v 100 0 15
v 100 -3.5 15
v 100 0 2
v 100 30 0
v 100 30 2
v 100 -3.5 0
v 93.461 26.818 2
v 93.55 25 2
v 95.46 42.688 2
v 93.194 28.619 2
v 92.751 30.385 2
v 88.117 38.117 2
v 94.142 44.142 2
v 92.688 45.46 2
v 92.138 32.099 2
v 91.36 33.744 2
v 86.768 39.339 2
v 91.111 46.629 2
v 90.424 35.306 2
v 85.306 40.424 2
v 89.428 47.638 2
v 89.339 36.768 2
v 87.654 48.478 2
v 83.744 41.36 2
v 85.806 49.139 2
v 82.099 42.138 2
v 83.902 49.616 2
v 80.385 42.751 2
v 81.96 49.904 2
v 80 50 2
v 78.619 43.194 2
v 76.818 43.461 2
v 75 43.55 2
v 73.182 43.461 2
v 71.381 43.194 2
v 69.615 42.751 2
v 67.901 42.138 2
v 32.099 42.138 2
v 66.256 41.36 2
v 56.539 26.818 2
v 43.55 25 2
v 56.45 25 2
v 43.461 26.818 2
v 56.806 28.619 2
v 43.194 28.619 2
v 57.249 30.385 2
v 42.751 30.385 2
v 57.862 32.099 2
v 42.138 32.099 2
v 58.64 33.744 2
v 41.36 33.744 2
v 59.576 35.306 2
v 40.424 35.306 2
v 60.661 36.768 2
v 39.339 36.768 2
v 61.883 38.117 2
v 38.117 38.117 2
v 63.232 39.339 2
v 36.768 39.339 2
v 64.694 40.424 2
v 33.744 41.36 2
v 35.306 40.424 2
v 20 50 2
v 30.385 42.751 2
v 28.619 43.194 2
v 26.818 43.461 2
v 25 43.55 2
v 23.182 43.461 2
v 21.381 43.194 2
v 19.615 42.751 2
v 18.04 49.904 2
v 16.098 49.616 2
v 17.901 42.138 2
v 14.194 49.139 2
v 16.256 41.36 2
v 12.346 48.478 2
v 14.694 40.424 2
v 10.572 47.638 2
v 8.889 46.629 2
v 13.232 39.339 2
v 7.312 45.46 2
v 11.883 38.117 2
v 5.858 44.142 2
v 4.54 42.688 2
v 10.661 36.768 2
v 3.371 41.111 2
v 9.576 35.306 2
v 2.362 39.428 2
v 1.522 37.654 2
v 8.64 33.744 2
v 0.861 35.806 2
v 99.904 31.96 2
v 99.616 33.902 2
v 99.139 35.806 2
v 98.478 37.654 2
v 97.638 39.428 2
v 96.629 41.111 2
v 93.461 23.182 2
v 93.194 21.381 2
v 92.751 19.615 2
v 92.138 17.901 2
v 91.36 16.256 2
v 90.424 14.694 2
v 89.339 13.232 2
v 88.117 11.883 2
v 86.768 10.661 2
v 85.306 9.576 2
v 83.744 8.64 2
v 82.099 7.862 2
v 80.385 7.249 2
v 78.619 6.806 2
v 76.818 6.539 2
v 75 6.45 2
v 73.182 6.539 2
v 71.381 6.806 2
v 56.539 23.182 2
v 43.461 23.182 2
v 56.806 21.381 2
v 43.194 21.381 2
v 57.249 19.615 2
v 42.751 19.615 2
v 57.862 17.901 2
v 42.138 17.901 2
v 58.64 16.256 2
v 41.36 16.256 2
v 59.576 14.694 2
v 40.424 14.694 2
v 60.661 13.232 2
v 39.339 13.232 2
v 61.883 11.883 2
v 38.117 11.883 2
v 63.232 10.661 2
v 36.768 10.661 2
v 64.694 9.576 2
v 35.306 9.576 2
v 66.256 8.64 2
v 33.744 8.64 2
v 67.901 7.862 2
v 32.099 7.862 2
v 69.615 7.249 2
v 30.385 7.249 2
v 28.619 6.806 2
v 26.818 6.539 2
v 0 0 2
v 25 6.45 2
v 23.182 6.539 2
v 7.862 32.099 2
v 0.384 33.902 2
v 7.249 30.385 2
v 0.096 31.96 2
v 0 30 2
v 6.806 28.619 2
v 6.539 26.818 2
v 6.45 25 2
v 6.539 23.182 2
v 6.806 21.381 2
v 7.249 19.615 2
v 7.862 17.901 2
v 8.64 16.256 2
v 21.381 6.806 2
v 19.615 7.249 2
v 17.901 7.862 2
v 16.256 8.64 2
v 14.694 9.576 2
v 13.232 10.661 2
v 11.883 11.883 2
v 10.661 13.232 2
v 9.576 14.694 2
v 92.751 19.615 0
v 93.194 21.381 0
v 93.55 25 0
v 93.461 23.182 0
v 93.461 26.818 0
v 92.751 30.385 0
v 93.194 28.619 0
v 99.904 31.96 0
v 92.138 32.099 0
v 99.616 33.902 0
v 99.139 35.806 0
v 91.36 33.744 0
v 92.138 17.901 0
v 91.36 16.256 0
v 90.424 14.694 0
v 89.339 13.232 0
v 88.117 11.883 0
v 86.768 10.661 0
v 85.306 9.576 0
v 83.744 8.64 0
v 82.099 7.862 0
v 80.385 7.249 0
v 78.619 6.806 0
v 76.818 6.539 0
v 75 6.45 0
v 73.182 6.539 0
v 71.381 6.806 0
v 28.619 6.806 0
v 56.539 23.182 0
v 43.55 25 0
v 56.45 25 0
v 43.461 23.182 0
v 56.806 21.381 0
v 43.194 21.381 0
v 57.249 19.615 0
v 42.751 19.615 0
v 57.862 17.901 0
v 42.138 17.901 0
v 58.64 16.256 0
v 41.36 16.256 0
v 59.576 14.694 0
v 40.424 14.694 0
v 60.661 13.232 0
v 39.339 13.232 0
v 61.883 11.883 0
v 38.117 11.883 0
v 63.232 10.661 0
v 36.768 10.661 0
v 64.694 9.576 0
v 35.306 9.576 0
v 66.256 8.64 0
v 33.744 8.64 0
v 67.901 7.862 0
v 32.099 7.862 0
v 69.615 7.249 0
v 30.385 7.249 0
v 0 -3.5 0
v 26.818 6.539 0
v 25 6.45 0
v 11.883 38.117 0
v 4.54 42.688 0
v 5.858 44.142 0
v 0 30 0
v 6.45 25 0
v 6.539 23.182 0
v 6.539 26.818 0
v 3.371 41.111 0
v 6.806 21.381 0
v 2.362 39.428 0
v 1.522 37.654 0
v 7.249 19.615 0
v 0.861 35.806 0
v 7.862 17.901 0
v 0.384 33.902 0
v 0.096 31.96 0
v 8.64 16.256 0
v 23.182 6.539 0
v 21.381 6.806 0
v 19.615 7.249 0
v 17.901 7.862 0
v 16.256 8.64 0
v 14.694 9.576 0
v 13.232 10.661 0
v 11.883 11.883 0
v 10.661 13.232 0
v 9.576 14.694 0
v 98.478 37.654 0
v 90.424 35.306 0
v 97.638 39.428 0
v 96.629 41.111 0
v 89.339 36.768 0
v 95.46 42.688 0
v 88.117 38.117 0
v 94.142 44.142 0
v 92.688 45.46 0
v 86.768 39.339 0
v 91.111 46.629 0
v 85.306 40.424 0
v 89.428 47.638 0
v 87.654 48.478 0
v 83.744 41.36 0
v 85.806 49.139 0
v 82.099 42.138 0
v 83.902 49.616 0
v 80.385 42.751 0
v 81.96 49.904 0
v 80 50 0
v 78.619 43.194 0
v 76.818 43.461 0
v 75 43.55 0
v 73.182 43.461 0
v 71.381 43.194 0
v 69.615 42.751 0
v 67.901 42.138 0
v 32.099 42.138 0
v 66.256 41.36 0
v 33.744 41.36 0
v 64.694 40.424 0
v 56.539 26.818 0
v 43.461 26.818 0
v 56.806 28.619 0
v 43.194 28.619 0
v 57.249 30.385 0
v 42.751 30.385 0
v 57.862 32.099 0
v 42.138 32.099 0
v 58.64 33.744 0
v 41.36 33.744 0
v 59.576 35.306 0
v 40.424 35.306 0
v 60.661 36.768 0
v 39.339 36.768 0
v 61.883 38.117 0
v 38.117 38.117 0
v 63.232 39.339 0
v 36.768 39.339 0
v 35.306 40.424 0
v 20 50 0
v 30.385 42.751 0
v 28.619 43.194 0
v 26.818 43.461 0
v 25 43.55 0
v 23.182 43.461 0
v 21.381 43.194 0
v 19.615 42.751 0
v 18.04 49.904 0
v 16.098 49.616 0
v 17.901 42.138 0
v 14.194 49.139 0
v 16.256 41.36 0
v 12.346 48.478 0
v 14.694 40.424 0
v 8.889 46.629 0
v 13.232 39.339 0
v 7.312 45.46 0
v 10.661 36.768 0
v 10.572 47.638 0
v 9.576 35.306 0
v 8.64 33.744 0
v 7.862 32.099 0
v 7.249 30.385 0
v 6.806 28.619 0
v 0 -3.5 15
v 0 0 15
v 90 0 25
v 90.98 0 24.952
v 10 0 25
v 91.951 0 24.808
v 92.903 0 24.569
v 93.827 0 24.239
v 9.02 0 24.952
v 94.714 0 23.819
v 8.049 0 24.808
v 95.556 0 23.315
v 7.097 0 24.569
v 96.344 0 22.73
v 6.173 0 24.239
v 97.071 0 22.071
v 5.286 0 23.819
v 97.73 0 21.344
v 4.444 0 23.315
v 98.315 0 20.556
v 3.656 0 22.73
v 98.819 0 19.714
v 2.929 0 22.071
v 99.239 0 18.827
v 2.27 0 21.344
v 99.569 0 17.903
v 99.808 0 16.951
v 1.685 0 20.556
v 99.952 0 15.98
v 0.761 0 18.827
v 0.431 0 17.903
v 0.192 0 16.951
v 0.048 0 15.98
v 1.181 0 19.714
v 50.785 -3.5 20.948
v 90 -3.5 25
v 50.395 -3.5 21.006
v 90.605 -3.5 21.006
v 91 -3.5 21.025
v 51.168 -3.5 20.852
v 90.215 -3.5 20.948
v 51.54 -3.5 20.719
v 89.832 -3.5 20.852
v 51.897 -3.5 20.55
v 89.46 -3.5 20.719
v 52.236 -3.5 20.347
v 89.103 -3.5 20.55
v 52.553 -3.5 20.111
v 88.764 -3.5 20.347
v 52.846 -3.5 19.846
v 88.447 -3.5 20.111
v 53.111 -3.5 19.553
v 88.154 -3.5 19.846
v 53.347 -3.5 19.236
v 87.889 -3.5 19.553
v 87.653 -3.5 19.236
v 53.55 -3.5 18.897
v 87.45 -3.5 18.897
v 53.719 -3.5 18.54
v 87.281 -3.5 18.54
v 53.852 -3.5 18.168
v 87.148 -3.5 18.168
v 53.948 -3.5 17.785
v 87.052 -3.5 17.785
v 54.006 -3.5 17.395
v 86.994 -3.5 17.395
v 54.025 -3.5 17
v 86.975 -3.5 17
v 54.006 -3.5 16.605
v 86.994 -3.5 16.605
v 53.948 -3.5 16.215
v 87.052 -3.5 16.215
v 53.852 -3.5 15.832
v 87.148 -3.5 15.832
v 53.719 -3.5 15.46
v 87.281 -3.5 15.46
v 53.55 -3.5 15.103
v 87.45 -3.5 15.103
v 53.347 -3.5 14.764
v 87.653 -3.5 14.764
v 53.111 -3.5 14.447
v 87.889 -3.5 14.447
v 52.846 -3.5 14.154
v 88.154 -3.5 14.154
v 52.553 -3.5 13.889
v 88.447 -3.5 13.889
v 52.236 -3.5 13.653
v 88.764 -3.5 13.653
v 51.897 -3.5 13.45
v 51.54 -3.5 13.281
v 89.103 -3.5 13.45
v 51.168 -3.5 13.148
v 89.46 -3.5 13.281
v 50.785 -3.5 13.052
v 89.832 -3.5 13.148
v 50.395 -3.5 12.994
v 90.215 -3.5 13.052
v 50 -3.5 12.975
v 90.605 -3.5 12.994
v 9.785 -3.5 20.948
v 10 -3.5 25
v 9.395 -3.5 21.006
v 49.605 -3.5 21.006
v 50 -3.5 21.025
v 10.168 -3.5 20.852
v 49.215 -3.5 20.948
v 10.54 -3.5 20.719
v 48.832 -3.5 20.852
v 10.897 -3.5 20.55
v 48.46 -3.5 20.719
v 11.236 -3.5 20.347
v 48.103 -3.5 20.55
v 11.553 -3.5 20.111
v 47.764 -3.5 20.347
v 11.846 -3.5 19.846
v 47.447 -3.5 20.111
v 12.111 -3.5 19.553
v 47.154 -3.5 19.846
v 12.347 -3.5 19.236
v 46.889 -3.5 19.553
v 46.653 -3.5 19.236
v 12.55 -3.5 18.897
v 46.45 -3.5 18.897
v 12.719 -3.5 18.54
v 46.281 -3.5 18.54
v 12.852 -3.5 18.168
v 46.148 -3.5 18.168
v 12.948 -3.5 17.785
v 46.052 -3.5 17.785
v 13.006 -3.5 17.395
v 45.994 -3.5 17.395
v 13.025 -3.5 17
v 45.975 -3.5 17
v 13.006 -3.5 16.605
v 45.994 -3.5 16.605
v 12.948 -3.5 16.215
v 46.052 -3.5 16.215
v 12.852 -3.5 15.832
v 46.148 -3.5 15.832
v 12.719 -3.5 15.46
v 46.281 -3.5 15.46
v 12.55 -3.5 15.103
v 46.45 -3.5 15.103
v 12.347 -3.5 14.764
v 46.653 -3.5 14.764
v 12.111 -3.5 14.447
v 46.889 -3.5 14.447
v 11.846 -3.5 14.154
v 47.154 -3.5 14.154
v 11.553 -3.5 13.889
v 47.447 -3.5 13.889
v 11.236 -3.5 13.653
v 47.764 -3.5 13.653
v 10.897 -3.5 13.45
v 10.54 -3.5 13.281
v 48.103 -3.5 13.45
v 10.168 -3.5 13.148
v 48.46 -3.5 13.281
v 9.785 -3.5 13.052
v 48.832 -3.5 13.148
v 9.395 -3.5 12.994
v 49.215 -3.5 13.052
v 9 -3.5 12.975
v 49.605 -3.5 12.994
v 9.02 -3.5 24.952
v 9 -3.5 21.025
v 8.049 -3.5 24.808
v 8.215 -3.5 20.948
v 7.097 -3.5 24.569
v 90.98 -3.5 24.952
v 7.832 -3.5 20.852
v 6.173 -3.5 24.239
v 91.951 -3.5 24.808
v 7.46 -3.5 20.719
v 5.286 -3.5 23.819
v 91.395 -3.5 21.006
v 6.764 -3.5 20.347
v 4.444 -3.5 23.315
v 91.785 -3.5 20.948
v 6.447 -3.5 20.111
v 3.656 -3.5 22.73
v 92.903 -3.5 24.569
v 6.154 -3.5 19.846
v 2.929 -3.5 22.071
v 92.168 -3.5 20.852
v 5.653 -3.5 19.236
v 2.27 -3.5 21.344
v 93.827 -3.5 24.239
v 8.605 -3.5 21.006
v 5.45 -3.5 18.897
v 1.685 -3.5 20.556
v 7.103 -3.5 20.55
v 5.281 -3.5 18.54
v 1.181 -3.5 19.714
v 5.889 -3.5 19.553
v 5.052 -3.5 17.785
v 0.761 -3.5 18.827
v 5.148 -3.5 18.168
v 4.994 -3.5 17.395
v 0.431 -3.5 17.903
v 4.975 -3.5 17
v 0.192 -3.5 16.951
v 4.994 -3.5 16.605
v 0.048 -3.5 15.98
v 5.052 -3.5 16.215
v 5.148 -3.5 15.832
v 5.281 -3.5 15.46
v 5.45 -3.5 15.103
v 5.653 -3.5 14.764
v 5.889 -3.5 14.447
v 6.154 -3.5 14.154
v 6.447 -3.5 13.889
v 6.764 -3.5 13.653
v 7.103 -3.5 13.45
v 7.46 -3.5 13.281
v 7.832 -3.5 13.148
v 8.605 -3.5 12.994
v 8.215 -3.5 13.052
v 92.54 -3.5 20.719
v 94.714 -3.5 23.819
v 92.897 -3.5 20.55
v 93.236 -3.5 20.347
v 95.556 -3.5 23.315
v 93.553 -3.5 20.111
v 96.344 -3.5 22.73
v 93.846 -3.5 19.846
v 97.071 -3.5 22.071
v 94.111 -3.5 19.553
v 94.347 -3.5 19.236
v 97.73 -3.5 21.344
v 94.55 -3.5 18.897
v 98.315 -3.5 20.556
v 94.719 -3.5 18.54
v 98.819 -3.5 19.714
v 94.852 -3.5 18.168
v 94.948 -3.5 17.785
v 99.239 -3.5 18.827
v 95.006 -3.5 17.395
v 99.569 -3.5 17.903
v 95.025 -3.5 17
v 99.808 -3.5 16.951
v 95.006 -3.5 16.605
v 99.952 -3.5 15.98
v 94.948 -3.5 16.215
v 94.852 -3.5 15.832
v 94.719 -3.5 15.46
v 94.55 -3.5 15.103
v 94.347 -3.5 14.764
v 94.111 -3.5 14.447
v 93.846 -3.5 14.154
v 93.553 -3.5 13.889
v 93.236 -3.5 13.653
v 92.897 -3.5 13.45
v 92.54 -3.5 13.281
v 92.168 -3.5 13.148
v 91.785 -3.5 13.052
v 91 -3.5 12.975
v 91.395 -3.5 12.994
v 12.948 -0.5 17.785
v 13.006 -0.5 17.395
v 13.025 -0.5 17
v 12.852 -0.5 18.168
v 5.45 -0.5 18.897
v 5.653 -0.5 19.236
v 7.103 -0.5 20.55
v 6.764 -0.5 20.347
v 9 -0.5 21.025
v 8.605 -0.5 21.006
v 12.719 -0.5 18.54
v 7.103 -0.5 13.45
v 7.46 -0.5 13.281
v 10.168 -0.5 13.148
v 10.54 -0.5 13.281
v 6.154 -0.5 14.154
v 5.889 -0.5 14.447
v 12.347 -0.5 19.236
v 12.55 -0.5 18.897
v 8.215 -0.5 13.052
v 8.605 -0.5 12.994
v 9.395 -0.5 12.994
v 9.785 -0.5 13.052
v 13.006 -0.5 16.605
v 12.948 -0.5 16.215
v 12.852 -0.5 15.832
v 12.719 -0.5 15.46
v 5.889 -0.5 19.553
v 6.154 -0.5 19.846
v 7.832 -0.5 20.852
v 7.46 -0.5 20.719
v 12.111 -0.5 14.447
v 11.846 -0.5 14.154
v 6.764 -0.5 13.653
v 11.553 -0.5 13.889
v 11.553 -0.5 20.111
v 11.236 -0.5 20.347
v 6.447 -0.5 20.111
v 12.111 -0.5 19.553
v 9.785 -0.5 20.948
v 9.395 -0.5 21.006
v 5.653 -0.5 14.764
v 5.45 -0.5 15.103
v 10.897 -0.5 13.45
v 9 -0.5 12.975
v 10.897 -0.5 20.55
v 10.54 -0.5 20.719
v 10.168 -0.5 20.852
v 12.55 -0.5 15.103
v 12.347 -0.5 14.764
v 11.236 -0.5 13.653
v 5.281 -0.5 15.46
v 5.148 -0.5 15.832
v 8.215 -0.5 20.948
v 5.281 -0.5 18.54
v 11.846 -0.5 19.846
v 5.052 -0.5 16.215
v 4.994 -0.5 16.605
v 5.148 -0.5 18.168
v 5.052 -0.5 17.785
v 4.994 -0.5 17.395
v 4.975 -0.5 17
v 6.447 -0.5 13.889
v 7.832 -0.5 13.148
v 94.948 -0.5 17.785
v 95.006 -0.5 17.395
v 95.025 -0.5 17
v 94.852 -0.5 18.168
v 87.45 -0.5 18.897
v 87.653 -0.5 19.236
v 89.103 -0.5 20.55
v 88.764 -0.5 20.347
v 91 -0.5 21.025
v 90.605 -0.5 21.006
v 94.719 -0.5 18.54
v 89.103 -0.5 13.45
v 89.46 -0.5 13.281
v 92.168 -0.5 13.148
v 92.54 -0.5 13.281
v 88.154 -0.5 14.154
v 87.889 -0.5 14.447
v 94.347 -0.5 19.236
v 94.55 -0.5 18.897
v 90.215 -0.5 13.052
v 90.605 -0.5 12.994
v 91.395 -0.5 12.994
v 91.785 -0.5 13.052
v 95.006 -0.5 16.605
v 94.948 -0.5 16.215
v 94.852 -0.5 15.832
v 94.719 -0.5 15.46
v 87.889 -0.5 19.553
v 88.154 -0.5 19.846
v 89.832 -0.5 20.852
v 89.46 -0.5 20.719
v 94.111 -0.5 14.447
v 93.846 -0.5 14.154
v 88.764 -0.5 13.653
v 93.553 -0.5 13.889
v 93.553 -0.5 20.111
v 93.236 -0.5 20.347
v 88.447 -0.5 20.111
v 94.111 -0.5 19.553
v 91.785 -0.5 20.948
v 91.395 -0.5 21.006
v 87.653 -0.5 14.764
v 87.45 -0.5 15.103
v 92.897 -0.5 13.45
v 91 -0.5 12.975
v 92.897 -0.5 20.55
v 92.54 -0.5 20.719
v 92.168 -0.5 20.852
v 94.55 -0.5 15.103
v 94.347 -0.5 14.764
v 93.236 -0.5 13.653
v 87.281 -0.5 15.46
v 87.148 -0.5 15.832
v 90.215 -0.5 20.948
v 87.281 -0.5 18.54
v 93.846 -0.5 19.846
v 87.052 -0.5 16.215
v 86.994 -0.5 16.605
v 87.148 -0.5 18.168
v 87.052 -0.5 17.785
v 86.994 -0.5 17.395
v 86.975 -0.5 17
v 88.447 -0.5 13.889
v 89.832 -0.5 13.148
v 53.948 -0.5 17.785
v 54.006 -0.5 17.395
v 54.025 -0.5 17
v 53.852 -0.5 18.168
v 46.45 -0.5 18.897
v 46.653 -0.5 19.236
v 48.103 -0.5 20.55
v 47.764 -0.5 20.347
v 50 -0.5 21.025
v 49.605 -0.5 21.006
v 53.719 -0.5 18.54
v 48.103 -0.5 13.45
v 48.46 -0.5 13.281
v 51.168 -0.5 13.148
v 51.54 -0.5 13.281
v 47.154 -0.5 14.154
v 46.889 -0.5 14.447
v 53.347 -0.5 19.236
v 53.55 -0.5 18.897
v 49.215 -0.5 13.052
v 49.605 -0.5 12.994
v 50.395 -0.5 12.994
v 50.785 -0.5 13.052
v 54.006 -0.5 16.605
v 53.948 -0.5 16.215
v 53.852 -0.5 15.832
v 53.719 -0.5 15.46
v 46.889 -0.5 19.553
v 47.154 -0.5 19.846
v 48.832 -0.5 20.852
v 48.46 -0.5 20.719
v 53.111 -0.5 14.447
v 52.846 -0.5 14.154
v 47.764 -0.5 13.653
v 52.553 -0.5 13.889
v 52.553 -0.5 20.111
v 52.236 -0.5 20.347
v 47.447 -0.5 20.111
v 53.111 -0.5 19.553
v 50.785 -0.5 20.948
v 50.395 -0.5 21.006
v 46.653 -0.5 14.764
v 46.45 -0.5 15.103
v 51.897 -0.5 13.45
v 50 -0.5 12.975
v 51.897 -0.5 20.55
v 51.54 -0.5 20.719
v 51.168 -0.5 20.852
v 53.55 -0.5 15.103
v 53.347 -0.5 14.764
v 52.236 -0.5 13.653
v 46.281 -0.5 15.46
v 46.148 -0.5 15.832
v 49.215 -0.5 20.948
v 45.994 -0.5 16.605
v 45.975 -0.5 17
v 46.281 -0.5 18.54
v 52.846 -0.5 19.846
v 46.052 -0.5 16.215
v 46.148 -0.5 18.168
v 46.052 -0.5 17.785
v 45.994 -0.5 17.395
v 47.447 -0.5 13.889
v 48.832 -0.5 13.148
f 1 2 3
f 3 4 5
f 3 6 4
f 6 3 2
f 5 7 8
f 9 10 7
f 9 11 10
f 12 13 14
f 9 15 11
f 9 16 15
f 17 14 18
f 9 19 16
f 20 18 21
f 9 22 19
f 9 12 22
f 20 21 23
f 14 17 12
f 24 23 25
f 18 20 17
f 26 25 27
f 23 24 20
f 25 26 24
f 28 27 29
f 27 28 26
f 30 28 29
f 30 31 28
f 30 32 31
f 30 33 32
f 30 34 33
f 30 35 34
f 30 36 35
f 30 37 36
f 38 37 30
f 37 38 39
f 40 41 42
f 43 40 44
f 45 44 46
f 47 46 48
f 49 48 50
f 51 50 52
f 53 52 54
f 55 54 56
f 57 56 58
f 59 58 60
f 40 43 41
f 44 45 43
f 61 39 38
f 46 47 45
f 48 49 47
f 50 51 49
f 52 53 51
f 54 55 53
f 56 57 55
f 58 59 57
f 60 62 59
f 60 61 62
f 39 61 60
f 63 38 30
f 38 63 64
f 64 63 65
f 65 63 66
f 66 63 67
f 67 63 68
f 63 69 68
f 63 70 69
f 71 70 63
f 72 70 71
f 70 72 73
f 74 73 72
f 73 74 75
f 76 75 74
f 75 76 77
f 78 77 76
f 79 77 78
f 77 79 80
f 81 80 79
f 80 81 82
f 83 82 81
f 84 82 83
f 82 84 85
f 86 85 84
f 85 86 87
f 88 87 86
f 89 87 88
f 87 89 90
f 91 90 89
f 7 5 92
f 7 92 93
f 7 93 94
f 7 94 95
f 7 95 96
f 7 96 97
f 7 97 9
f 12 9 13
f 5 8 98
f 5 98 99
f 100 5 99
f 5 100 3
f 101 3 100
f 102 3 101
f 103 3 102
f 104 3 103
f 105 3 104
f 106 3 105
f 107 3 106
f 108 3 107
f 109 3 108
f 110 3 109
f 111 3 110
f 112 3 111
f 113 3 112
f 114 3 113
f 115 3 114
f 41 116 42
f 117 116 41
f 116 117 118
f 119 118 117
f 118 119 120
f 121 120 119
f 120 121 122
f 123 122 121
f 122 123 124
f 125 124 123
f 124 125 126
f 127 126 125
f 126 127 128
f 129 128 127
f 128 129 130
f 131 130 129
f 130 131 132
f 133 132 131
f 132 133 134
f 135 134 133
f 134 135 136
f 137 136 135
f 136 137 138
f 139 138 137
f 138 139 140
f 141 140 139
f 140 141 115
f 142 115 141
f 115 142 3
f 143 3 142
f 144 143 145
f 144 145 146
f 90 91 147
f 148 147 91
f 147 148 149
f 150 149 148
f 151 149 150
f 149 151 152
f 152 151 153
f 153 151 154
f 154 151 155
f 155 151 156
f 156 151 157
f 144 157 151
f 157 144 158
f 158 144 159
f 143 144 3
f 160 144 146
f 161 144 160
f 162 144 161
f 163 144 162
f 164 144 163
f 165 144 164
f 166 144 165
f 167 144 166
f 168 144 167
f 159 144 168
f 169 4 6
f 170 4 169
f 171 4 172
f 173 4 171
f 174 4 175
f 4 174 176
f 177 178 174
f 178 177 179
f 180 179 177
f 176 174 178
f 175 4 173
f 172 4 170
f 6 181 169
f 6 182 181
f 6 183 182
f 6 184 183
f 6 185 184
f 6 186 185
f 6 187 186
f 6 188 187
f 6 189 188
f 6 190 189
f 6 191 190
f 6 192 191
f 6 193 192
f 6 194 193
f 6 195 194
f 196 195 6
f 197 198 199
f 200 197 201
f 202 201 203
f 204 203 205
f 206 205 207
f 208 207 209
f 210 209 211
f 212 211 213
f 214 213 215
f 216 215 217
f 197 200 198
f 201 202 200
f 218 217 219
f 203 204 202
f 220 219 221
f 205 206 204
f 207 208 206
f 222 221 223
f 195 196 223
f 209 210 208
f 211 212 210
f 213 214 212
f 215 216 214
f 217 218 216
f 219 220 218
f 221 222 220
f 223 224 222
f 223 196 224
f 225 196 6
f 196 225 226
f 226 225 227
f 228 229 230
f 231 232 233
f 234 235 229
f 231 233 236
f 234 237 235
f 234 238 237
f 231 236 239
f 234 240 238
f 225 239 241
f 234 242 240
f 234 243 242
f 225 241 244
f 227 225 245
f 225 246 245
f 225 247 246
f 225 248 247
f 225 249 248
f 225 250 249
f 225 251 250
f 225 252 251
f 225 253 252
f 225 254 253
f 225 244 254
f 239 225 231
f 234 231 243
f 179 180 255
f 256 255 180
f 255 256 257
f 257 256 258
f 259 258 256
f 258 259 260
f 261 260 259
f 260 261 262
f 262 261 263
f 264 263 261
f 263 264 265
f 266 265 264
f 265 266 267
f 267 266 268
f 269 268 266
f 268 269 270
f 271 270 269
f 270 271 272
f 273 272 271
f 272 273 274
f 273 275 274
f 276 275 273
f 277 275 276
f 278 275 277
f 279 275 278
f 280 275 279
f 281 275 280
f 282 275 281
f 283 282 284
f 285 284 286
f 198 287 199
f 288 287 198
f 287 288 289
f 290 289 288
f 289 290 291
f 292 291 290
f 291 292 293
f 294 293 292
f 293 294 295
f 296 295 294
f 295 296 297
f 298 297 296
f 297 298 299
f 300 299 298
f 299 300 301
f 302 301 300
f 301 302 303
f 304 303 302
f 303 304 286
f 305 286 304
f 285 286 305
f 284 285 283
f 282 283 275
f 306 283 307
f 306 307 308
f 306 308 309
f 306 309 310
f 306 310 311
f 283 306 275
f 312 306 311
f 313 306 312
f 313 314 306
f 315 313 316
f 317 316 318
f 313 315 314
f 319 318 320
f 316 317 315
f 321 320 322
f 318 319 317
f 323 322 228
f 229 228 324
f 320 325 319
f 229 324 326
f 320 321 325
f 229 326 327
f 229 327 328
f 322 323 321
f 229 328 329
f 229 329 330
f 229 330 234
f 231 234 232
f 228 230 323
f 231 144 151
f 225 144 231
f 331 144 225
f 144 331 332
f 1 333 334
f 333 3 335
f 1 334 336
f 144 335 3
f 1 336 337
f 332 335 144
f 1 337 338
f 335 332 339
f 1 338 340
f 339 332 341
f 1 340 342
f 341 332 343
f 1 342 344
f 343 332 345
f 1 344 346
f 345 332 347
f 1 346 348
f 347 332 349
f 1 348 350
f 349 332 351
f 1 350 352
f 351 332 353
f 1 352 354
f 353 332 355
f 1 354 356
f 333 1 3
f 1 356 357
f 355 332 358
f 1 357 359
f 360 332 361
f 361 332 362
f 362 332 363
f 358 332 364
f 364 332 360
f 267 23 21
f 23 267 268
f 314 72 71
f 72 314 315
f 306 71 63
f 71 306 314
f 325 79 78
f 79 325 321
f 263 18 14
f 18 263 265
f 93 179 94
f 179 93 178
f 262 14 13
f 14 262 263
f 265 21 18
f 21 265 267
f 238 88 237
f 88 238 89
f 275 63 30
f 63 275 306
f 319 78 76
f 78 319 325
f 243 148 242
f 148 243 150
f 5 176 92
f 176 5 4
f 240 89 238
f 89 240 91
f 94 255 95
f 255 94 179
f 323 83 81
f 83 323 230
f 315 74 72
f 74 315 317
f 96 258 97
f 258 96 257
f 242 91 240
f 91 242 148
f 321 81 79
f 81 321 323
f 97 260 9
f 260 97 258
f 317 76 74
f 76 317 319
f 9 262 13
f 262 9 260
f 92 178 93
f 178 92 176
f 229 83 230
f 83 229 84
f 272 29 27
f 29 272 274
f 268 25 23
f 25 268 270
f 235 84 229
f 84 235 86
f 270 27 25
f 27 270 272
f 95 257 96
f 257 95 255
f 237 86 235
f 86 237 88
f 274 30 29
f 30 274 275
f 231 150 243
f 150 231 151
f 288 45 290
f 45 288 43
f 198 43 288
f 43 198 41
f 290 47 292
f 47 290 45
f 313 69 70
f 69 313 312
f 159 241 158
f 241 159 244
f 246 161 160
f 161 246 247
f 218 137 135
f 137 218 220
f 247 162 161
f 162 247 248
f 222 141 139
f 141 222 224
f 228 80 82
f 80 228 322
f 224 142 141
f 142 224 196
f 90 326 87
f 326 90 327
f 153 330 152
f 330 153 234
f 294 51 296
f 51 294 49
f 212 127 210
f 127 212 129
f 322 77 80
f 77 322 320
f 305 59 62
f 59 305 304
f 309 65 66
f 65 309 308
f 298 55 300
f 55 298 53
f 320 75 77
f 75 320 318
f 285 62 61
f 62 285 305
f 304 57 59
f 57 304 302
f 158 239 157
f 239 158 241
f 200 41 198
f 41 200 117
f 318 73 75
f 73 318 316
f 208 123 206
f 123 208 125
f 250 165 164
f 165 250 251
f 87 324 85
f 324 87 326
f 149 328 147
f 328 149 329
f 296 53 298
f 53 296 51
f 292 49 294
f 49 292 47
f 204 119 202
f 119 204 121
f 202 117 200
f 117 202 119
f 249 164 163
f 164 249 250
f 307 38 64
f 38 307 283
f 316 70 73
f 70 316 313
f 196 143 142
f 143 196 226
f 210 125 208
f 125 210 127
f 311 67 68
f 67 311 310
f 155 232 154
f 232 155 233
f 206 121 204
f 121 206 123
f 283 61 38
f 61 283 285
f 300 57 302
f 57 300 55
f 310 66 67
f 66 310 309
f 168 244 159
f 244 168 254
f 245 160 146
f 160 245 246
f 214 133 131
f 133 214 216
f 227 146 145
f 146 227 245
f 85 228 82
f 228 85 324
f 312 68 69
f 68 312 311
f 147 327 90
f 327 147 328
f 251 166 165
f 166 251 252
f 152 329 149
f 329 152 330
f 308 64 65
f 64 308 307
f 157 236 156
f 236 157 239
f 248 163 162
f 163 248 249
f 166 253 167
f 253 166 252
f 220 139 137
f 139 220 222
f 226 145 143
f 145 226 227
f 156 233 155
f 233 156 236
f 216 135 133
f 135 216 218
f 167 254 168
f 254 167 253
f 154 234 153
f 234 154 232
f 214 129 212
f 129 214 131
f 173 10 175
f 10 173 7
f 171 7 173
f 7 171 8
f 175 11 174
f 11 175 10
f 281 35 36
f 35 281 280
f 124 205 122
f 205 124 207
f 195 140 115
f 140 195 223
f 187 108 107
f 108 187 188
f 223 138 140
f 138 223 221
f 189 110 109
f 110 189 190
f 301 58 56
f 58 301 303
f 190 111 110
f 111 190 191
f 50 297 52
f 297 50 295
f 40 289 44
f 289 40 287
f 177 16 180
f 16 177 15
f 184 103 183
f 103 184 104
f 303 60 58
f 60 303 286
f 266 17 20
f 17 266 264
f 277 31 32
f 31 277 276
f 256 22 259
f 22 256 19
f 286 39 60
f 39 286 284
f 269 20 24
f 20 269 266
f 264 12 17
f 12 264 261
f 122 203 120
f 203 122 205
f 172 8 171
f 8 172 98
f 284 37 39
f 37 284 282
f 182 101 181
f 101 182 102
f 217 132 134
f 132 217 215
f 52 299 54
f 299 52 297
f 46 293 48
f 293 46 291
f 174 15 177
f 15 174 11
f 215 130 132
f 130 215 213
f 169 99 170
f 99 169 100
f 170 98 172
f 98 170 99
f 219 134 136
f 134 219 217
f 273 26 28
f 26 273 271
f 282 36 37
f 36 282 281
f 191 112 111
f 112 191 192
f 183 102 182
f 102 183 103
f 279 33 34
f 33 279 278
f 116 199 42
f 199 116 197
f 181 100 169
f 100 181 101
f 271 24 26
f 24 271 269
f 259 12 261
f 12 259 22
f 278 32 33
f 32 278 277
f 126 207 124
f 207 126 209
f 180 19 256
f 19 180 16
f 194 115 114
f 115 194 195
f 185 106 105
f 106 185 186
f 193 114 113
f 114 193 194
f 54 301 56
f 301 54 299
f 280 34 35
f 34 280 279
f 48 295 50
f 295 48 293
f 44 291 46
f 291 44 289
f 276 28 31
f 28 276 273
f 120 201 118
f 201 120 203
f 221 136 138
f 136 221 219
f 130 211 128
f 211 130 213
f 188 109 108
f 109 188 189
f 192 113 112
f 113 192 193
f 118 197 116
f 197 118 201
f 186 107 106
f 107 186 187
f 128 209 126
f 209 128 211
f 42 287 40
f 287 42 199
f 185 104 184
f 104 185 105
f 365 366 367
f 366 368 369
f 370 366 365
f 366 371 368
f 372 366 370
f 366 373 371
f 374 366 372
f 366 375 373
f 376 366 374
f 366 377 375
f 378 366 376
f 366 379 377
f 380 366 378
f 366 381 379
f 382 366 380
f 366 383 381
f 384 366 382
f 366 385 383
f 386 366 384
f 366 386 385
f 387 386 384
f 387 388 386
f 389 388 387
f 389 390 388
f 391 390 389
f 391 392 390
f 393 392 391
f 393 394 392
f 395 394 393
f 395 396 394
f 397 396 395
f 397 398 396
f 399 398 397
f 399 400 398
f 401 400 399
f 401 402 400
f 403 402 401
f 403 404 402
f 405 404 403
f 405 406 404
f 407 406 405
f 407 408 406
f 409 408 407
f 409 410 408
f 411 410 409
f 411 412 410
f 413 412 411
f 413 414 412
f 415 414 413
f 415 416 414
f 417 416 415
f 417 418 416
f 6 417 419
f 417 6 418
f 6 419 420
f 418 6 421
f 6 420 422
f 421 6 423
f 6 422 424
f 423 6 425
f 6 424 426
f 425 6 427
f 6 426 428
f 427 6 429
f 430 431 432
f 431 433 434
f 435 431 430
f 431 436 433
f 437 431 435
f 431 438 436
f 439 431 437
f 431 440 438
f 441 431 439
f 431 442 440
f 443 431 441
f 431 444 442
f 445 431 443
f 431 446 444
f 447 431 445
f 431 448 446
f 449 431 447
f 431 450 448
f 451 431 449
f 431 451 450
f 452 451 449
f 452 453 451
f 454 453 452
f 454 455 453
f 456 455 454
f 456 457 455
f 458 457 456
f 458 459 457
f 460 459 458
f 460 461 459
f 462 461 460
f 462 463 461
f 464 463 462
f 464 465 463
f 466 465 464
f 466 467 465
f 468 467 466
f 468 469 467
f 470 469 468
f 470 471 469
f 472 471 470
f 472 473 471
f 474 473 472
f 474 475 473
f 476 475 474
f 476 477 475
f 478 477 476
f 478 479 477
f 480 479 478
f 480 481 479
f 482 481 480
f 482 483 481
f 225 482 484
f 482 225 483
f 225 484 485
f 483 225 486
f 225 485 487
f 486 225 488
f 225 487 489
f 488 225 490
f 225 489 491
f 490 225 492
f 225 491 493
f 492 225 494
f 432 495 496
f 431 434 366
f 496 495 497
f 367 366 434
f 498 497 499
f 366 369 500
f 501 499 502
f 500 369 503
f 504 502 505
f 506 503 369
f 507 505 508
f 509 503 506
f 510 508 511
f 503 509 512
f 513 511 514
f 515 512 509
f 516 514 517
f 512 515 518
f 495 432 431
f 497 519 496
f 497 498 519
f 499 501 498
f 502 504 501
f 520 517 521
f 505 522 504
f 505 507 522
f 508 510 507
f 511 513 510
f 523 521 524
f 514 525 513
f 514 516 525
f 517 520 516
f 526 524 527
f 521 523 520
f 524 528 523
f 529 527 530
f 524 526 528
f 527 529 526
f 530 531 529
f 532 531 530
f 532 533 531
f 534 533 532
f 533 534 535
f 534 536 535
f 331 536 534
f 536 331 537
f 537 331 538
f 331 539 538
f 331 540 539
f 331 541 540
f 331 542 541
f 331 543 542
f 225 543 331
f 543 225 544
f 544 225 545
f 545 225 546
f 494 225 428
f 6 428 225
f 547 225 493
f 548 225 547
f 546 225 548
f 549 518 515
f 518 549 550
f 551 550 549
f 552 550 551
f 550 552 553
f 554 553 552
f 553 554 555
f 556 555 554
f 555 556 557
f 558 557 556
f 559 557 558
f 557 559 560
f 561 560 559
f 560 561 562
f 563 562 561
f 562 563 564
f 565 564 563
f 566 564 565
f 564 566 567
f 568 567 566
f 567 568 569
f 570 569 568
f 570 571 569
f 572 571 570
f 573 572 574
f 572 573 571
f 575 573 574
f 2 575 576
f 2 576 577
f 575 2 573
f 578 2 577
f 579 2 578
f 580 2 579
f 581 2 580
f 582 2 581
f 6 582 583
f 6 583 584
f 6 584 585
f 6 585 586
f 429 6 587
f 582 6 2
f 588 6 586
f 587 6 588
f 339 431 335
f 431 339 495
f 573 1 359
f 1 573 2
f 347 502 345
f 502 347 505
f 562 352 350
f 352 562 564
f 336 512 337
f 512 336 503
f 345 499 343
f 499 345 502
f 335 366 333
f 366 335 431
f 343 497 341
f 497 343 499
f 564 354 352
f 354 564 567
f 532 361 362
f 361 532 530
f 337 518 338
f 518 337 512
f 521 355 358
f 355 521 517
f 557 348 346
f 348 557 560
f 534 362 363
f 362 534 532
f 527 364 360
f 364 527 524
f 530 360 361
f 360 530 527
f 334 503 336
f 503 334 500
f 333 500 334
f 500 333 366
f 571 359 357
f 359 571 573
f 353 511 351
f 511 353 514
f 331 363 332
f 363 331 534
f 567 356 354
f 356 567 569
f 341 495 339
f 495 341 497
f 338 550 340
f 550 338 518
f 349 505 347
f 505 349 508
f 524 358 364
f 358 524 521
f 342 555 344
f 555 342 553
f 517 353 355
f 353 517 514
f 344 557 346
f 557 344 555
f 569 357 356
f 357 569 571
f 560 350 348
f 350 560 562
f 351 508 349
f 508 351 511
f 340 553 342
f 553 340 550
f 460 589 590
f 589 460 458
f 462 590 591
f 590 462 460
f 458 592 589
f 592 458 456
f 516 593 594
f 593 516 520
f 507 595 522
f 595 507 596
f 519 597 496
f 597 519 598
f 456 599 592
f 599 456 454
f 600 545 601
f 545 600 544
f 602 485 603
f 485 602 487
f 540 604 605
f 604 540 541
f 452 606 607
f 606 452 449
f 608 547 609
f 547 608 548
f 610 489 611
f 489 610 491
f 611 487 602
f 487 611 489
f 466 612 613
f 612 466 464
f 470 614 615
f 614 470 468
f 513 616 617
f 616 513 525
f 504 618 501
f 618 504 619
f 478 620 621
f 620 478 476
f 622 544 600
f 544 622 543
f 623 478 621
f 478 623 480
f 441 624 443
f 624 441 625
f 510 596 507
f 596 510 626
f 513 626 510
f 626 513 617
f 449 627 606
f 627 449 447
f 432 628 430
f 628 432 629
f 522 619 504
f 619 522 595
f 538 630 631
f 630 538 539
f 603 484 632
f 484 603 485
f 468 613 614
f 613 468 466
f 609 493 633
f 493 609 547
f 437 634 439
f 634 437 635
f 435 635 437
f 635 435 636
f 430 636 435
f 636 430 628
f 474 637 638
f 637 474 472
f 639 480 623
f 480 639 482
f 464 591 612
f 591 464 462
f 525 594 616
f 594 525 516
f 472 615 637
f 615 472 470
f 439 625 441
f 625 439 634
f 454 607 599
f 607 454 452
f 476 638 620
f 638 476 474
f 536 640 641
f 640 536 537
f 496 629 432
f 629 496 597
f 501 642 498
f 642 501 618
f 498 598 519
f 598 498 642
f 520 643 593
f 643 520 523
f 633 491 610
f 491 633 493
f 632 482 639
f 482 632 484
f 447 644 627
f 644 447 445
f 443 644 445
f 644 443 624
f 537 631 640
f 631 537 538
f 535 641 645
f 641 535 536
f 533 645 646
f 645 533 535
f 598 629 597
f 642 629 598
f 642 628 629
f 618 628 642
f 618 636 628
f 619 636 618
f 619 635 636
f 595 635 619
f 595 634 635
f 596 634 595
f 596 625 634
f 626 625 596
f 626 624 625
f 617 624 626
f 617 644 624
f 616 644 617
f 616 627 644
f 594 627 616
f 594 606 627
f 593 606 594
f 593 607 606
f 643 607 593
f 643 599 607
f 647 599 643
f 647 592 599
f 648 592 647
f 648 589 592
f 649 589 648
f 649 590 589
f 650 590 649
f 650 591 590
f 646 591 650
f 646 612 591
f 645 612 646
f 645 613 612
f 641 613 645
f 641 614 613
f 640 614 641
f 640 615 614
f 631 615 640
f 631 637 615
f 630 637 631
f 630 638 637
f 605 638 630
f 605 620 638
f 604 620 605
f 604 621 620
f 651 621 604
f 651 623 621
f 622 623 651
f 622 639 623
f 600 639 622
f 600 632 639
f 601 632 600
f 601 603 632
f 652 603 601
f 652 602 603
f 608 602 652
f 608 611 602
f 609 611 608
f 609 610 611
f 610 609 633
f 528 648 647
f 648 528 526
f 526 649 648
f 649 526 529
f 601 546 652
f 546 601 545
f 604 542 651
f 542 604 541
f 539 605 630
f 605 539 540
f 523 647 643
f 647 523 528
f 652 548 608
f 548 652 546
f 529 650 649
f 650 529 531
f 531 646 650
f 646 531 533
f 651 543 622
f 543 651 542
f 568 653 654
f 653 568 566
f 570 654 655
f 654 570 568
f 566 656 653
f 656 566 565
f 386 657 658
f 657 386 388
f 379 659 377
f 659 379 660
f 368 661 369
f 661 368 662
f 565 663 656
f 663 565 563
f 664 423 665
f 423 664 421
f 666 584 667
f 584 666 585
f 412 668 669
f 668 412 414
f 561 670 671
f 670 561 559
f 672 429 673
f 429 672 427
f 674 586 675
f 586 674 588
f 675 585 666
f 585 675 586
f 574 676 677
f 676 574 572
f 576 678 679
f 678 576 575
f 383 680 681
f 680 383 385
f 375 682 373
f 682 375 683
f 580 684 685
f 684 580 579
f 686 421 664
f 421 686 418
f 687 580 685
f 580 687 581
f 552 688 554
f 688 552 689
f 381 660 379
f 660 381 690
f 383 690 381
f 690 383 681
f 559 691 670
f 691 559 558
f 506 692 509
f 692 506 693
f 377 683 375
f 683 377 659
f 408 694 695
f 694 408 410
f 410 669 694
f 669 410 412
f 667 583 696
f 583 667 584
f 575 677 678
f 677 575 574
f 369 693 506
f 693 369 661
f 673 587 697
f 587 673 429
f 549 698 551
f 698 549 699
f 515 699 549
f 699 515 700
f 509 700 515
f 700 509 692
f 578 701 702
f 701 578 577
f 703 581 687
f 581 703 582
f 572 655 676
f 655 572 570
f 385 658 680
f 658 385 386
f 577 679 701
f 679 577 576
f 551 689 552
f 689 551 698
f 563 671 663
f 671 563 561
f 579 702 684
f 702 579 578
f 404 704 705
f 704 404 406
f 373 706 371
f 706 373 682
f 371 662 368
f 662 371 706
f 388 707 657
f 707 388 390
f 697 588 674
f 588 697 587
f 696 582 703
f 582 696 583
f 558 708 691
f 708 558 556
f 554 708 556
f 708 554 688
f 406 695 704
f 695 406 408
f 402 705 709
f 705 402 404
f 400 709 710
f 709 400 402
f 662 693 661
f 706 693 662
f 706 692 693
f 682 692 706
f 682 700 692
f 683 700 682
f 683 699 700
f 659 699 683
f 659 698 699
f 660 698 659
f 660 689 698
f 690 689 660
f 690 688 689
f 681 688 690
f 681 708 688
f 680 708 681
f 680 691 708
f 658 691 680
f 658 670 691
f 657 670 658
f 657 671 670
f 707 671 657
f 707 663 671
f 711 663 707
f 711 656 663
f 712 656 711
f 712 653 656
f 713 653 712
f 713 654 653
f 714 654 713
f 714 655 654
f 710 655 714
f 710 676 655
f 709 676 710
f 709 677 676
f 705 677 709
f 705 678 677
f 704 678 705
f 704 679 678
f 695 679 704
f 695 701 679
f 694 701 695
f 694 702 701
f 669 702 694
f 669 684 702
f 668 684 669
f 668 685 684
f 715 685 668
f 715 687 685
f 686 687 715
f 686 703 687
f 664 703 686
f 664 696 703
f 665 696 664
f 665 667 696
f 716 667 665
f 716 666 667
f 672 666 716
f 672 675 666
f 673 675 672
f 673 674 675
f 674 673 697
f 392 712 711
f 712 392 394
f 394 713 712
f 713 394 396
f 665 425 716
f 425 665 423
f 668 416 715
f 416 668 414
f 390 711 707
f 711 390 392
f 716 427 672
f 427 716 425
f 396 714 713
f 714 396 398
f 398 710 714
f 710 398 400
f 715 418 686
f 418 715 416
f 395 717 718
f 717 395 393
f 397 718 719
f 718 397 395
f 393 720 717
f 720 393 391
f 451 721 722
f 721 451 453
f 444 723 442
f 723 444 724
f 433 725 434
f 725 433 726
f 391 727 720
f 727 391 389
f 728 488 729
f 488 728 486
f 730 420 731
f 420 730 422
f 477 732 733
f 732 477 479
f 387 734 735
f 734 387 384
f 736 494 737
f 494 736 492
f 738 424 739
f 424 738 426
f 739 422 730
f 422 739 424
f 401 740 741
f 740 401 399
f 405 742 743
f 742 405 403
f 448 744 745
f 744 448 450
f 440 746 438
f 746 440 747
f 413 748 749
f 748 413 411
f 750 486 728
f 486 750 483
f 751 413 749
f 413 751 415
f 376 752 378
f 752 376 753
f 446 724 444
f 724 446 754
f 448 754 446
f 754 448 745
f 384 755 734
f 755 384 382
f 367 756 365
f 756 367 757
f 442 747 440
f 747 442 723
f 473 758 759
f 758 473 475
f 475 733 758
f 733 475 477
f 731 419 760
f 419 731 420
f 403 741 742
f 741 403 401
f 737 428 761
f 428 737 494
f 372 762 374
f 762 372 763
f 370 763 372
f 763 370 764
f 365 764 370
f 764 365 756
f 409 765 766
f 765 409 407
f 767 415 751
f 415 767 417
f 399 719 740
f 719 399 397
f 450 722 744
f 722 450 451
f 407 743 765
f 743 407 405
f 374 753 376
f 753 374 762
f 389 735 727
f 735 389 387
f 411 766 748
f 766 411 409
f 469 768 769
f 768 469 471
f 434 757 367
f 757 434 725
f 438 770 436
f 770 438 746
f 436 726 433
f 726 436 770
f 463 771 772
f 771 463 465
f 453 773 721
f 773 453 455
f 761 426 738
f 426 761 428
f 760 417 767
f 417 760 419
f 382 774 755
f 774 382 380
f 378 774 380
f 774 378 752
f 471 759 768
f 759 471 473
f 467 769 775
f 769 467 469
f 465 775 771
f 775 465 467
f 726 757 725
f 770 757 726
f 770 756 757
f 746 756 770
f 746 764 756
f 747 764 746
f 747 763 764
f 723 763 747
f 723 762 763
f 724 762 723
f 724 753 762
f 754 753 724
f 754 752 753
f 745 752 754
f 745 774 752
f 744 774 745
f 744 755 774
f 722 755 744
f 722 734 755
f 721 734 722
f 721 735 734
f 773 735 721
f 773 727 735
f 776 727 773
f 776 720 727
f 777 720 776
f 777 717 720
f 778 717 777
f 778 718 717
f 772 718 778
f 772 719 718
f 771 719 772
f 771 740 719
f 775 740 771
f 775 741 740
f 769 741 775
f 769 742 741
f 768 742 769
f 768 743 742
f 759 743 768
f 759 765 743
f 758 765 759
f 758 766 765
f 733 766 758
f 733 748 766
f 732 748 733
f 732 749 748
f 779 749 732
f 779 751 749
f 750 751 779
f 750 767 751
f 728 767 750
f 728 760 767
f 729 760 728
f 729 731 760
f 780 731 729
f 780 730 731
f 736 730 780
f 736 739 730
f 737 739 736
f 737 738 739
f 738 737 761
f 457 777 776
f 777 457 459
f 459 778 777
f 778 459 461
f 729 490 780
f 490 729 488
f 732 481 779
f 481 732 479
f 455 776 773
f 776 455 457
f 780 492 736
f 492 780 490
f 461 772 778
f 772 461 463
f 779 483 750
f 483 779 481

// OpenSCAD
$fn = 64;

module rcube(size, radius, center = false){
    points = [
        for (p = [
            [radius, radius],
            [radius, size.y - radius],
            [size.x - radius, radius],
            [size.x - radius, size.y - radius]
        ])
        if (center) [p[0] - size.x / 2, p[1] - size.y / 2]
        else p
    ];
    hull(){
        for (p = points) translate(p) cylinder(r=radius, h=size.z);
    }
}


difference() {
    union() {
        cube([100, 20, 2]);
        rcube([100, 50, 2], 20);
    }
    
    translate([25, 25])
    cylinder(h=30, d=37.1, center=true);
    
    translate([75, 25])
    cylinder(h=30, d=37.1, center=true);
}

difference() {
    rotate([90, 0, 0])
    union() {
        cube([100, 10, 3.5]);
        rcube([100, 25, 3.5], 10);
    }

    translate([9, -0.5, 17])
    rotate([90, 0, 0])
    cylinder(h=3.1, d=8.05);
    
    translate([91, -0.5, 17])
    rotate([90, 0, 0])
    cylinder(h=3.1, d=8.05);
    
    translate([50, -0.5, 17])
    rotate([90, 0, 0])
    cylinder(h=3.1, d=8.05);
}
